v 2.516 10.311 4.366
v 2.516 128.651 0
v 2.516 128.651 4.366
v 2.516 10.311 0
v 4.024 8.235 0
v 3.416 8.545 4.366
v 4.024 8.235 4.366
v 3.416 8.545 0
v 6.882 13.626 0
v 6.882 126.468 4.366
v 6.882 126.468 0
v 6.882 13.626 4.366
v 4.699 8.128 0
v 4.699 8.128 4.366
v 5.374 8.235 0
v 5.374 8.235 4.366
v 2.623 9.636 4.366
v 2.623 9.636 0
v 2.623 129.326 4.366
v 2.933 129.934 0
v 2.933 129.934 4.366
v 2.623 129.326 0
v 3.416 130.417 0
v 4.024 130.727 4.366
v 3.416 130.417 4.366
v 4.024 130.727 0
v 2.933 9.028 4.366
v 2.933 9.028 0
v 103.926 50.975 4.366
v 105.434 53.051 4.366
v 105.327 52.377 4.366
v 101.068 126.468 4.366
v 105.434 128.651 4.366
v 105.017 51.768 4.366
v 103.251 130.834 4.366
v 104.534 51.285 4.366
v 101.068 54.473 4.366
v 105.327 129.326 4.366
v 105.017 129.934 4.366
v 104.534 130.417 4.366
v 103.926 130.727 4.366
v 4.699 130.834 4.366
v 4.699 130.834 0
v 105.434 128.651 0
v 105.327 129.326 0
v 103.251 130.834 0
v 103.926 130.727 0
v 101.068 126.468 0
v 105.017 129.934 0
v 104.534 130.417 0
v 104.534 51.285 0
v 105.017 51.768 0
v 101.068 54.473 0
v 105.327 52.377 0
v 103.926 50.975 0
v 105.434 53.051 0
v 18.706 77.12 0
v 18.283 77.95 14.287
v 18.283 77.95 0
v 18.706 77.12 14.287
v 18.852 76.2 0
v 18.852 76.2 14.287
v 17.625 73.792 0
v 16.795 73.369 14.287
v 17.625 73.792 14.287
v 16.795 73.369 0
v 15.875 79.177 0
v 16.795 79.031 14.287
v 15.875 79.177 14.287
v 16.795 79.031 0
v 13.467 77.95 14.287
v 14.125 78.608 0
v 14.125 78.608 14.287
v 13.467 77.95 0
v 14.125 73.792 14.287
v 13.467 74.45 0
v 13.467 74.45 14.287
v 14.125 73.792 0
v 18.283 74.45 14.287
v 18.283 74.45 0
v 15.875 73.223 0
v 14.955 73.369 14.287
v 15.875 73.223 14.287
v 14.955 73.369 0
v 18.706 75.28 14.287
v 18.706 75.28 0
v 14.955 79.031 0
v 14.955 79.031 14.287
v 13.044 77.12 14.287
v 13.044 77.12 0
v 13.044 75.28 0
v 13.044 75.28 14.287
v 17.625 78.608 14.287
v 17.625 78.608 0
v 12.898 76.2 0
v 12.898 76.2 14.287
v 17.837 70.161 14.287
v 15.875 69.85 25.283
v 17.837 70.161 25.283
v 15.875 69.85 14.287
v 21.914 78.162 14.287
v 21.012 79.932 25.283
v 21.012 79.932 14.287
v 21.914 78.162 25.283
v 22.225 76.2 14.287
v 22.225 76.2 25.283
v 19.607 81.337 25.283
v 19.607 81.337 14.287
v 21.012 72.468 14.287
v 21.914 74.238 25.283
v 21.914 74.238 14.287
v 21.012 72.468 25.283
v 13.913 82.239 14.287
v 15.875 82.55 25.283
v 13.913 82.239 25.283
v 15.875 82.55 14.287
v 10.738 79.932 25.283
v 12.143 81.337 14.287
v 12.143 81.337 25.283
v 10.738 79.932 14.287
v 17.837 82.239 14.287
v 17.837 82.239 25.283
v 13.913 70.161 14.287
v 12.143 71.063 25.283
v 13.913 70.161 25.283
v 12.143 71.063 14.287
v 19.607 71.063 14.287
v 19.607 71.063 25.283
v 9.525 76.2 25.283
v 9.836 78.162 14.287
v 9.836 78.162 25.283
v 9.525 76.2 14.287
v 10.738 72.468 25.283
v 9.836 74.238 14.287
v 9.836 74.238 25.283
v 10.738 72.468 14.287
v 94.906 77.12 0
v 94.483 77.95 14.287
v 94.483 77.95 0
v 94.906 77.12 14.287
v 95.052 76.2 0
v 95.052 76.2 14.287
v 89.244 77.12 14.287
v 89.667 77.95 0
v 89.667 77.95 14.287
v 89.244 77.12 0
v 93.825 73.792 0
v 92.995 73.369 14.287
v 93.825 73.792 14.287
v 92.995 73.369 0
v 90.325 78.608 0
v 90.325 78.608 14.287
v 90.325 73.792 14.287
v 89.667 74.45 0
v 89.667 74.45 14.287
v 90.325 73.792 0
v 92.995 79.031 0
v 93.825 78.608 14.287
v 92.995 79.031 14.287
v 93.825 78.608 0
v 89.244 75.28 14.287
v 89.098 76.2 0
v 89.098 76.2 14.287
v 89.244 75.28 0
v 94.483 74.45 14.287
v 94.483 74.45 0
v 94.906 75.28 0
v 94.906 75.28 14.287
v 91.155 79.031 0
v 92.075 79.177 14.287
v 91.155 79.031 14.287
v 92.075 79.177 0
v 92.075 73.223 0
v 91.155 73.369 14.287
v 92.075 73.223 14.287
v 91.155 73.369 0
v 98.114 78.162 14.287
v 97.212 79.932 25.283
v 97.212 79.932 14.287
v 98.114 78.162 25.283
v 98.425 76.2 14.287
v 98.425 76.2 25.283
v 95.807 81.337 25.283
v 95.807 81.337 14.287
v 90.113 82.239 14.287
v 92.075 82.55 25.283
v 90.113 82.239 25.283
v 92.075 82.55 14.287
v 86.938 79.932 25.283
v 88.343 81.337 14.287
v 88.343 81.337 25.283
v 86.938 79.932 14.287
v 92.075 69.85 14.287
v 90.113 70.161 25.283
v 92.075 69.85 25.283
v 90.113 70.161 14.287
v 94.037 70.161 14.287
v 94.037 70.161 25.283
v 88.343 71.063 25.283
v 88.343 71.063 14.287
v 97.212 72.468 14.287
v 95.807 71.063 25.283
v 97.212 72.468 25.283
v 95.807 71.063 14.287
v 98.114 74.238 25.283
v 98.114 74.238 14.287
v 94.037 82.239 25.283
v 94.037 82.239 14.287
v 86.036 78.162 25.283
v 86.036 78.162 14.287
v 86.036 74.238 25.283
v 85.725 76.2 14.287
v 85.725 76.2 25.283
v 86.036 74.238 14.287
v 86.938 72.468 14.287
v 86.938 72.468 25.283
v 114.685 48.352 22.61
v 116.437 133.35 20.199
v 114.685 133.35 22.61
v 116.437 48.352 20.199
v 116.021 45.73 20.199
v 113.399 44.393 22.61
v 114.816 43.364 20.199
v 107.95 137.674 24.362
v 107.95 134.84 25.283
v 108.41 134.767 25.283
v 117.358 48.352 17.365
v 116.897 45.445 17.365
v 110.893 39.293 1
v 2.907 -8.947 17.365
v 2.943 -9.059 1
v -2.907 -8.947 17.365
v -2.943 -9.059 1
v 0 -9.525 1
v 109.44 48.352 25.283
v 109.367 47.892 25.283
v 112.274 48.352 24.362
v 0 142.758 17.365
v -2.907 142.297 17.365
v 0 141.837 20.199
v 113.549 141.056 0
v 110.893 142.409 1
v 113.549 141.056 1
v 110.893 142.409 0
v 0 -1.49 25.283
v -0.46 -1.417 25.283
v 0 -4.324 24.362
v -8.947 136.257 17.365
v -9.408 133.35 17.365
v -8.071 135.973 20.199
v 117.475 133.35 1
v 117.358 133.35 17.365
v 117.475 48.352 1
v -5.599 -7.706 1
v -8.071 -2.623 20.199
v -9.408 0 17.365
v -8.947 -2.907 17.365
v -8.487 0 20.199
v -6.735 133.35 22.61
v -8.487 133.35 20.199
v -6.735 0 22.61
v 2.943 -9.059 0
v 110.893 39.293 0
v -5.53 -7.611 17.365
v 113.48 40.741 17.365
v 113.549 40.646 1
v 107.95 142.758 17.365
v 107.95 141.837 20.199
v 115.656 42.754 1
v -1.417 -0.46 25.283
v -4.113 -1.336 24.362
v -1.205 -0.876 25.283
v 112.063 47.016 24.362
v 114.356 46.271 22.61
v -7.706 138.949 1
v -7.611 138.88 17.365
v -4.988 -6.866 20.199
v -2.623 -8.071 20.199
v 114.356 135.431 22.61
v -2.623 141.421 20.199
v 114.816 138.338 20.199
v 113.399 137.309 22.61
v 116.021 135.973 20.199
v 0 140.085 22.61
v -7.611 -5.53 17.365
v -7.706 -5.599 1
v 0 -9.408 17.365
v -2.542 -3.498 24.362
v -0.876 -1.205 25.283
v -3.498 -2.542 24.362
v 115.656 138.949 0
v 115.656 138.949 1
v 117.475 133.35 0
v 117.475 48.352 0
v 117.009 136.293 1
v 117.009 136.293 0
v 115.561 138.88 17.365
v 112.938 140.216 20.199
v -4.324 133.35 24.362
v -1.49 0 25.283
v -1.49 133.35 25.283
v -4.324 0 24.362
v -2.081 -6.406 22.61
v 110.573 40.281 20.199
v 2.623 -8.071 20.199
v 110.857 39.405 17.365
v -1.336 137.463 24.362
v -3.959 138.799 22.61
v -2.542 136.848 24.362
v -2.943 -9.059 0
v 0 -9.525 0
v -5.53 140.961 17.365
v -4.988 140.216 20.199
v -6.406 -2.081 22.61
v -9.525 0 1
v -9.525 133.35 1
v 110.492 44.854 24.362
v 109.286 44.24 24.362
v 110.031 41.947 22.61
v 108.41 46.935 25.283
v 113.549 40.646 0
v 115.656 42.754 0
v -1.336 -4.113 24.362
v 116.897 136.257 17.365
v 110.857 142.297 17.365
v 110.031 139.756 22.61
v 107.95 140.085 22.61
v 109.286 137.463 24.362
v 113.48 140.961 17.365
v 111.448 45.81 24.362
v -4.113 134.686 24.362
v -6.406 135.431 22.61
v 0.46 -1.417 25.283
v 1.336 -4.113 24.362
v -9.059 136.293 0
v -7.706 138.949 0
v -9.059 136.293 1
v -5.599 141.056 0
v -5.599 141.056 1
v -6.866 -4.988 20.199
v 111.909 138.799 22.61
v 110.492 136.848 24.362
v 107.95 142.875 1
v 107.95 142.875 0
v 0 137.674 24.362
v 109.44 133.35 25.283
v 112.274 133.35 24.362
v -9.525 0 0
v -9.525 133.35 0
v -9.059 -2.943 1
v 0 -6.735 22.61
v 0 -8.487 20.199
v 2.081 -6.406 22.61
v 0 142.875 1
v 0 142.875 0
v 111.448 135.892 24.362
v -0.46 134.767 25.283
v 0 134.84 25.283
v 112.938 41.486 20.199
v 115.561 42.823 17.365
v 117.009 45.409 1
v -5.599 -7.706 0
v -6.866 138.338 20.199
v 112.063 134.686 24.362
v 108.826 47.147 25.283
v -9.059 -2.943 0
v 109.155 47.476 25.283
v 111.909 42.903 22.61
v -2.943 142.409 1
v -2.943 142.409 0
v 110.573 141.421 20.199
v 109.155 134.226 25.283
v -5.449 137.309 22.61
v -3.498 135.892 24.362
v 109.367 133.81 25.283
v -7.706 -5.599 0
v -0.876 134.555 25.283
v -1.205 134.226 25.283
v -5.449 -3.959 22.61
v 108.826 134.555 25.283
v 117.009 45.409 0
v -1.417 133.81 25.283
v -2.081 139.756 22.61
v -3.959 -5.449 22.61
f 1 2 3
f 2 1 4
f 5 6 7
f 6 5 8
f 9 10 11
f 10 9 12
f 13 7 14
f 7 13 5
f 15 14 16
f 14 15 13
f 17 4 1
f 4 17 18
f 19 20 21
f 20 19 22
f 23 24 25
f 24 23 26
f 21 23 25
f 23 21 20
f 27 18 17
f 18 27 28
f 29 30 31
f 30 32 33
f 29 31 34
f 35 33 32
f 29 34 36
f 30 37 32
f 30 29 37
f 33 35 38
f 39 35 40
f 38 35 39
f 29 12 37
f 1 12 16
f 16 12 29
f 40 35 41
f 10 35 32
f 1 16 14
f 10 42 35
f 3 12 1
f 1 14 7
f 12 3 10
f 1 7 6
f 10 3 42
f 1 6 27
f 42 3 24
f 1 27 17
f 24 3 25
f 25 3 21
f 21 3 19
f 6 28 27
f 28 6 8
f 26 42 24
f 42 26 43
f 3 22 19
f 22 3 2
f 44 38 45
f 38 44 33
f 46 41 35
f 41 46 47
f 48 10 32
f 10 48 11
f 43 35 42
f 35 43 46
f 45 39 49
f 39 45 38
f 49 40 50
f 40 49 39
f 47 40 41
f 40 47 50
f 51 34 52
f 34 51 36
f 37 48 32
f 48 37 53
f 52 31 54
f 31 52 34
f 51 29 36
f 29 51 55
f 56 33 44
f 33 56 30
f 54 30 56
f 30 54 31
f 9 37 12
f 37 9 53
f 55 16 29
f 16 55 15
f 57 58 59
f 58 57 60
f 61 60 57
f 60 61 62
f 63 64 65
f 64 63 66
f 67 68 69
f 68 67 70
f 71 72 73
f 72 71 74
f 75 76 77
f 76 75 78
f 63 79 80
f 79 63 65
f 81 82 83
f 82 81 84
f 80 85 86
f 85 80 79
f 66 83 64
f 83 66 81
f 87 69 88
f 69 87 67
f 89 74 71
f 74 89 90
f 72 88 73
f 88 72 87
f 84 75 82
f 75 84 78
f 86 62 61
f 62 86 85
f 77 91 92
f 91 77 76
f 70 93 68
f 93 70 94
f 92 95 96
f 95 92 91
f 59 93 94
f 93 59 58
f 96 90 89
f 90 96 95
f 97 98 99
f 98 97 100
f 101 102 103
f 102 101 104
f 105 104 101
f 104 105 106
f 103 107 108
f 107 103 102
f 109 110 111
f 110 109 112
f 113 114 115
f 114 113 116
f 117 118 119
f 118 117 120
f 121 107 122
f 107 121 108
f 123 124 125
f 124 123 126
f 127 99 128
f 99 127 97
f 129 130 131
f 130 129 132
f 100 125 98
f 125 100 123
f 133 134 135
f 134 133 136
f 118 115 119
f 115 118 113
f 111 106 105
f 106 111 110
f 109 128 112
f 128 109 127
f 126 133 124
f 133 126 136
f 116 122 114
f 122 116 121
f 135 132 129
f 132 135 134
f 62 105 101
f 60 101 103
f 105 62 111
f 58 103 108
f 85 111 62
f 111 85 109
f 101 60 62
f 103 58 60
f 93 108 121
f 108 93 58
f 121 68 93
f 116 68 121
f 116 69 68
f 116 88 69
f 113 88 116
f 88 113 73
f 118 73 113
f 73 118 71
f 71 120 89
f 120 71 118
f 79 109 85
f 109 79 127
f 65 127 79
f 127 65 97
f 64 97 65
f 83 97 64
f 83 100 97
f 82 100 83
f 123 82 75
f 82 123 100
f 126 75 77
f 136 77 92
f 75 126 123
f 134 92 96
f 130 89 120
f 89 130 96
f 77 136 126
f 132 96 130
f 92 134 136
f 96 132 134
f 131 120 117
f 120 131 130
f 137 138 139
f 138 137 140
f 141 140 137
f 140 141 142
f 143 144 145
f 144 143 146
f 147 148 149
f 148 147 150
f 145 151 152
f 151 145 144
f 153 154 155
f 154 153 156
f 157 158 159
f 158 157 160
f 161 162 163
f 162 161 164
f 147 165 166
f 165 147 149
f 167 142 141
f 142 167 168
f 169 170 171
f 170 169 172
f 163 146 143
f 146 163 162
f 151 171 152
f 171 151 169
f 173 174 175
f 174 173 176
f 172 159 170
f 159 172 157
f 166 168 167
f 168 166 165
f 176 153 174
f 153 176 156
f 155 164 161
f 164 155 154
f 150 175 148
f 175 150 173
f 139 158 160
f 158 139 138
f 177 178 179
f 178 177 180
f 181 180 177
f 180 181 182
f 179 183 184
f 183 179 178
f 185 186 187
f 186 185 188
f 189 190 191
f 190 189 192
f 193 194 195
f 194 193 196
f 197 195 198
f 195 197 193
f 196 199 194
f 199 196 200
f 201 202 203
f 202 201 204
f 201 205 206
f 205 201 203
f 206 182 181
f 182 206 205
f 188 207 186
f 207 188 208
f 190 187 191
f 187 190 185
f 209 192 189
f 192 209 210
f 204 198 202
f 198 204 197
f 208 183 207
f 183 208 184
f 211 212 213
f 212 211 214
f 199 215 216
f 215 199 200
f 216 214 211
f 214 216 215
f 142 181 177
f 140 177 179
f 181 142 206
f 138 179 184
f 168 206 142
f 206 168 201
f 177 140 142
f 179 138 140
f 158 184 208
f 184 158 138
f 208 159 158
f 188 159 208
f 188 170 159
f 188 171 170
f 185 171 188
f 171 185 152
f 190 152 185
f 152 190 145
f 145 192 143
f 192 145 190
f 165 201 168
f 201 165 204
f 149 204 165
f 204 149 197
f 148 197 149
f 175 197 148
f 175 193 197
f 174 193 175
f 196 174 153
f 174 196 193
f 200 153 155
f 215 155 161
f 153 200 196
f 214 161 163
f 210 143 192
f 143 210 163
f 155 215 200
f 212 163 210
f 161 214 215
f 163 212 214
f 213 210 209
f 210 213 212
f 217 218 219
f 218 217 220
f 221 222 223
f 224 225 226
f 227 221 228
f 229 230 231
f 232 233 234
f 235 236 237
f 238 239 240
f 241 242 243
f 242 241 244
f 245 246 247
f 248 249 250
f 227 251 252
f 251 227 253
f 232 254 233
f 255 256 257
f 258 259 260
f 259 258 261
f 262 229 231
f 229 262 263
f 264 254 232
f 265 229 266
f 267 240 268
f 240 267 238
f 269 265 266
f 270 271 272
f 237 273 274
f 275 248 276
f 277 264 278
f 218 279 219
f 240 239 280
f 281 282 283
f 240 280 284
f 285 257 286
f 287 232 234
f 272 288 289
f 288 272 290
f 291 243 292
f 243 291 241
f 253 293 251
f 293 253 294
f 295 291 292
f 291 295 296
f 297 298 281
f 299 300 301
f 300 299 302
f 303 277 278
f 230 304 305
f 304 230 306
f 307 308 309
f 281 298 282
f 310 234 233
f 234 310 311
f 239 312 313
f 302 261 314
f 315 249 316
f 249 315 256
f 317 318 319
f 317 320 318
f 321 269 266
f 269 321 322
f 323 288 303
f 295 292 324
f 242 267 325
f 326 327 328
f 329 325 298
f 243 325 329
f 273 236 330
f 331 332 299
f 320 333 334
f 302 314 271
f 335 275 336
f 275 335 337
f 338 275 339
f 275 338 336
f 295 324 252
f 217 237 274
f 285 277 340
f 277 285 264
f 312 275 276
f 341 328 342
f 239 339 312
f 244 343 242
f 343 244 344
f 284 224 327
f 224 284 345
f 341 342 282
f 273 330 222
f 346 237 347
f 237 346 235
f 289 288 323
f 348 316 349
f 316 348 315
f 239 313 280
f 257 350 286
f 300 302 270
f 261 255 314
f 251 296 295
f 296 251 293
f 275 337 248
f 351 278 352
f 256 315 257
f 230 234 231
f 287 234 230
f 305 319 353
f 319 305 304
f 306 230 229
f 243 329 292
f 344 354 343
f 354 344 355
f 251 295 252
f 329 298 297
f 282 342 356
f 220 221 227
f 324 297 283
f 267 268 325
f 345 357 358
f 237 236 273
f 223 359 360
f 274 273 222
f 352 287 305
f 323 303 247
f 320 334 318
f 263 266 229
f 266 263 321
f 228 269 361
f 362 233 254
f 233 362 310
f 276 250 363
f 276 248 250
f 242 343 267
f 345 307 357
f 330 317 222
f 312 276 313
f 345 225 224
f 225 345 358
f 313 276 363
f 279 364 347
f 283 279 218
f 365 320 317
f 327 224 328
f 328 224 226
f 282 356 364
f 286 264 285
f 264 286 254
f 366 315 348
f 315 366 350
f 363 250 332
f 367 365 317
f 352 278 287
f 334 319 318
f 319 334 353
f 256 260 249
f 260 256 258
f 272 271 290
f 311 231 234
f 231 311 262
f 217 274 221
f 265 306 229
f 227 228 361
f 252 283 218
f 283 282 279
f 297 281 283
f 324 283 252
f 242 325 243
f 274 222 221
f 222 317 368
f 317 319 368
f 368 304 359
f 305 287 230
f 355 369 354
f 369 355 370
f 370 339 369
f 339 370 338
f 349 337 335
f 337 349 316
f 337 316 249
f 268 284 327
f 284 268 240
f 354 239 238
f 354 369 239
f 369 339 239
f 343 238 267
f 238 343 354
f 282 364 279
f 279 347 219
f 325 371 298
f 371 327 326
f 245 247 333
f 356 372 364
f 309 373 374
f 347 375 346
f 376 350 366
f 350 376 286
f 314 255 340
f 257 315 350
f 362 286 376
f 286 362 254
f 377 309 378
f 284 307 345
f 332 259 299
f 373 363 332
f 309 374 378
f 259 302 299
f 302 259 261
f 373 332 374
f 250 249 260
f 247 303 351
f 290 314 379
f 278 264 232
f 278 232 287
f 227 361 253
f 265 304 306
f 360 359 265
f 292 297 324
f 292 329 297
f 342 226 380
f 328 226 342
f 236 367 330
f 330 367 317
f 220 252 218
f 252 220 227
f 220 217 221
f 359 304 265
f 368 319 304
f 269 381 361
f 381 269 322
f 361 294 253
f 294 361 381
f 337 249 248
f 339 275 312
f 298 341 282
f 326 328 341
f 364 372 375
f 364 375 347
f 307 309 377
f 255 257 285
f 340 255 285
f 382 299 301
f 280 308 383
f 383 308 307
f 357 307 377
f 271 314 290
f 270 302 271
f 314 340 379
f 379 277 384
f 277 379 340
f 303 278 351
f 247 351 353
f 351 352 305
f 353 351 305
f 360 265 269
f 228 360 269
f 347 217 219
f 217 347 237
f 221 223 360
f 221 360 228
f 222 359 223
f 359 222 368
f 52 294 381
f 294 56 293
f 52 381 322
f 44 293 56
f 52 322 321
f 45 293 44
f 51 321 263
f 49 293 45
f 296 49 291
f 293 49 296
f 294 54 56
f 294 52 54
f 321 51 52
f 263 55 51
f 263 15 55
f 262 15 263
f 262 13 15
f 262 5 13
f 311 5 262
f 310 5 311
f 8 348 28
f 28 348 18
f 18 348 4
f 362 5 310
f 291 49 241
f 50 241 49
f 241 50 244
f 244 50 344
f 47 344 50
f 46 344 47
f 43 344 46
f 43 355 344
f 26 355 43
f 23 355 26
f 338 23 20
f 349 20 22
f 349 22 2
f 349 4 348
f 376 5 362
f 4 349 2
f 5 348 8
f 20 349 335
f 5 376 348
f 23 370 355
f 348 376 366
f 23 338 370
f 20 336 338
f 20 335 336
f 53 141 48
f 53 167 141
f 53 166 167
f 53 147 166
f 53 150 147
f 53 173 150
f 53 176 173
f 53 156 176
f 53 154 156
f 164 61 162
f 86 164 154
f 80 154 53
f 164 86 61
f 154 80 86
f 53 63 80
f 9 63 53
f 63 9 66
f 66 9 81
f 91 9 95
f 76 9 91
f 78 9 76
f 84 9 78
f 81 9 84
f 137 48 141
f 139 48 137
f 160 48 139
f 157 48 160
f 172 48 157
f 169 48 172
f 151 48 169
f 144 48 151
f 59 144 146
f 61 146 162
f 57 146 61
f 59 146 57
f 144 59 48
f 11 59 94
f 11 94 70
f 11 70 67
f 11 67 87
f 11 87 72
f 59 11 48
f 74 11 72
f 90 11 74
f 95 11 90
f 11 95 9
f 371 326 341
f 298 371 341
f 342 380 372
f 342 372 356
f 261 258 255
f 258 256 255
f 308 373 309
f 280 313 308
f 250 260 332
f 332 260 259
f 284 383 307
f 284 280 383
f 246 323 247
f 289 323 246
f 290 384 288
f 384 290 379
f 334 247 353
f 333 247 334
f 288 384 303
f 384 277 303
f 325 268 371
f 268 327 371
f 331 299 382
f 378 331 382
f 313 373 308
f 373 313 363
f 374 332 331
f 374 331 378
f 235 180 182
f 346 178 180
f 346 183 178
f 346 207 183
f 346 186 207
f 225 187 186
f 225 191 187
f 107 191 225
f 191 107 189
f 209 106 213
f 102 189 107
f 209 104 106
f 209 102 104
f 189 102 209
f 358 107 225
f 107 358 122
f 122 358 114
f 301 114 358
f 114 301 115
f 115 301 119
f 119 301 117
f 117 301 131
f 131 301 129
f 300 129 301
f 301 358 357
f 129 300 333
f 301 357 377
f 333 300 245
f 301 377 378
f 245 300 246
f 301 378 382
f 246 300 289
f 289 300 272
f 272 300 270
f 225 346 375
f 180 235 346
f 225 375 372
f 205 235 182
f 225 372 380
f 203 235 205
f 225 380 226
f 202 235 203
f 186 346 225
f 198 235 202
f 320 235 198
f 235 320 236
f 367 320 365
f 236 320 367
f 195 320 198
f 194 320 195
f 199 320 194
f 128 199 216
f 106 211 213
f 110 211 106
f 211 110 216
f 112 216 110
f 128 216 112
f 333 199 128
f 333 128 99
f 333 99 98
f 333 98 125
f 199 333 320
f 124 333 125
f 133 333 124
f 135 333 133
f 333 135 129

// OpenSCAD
$fn=20;

width=5;
height=6;
thickness=1;
radius=3/8;
deadrise=24.5;
groove=11/64;
groove_inset=0.185;
screw_inset=1;
screw_countersink_depth=7/16;
screw_countersink_width=0.5;
srew_main_bore=15/64;

mm=25.4;

width_mm=width*mm;
height_mm=height*mm;
thickness_mm=thickness*mm;
radius_mm=radius*mm;

groove_mm=groove*mm;
groove_inset_mm=groove_inset*mm;

screw_inset_mm=screw_inset*mm;
screw_countersink_depth_mm=screw_countersink_depth*mm;
screw_countersink_width_mm=screw_countersink_width*mm;
srew_main_bore_mm=srew_main_bore*mm;

module plate() {
  hull() {
    linear_extrude(height=1) {
      circle(radius_mm);
      translate([0,height_mm-radius_mm*2,0]) circle(radius_mm);
      translate([width_mm-radius_mm*2,height_mm-radius_mm*2,0]) circle(radius_mm);
      translate([width_mm-radius_mm*2,tan(deadrise)*width_mm-radius_mm,0]) circle(radius_mm);  
    }

    translate([0,0,thickness_mm-radius_mm]) {
      sphere(radius_mm);
      translate([0,height_mm-radius_mm*2,0]) sphere(radius_mm);
      translate([width_mm-radius_mm*2,height_mm-radius_mm*2,0]) sphere(radius_mm);
      translate([width_mm-radius_mm*2,tan(deadrise)*width_mm-radius_mm,0]) sphere(radius_mm);  
    }
  }
}

module grooves() {
  module one() {  
    translate([groove_inset_mm,tan(90-deadrise)*groove_inset_mm,-1]) cylinder(groove_mm+1,groove_mm/2,groove_mm/2);
  }
  module two() {
    translate([groove_inset_mm,height_mm-radius_mm*2-groove_inset_mm,-1]) cylinder(groove_mm+1, groove_mm/2, groove_mm/2);
  }
  module three() {
    translate([width_mm-radius_mm*2-groove_inset_mm,height_mm-radius_mm*2-groove_inset_mm,-1]) cylinder(groove_mm+1, groove_mm/2, groove_mm/2);
  }
  module four() {
  translate([width_mm-radius_mm*2-groove_inset_mm,tan(deadrise)*width_mm-radius_mm+groove_inset_mm,-1]) cylinder(groove_mm+1, groove_mm/2, groove_mm/2);
  }
    
    
  hull() {
    one();
    two();
  }
  
  hull() {
    two();
    three();
  }
  
  hull() {
    three();
    four();    
  }  

  hull() {
    four(); 
    one();
  } 
}


module screws() {
  translate([screw_inset_mm-radius_mm,height_mm/2,-1]) 
    cylinder(thickness_mm+2, srew_main_bore_mm/2, srew_main_bore_mm/2);
  translate([screw_inset_mm-radius_mm,height_mm/2,thickness_mm-screw_countersink_depth_mm]) 
    cylinder(thickness_mm+1, screw_countersink_width_mm/2, screw_countersink_width_mm/2);


  translate([width_mm-radius_mm-screw_inset_mm,height_mm/2,-1]) 
    cylinder(thickness_mm+2, srew_main_bore_mm/2, srew_main_bore_mm/2);
  translate([width_mm-radius_mm-screw_inset_mm,height_mm/2,thickness_mm-screw_countersink_depth_mm]) 
    cylinder(thickness_mm+1, screw_countersink_width_mm/2, screw_countersink_width_mm/2);        
}

difference() {
  plate();
  grooves();
  screws();    
}
